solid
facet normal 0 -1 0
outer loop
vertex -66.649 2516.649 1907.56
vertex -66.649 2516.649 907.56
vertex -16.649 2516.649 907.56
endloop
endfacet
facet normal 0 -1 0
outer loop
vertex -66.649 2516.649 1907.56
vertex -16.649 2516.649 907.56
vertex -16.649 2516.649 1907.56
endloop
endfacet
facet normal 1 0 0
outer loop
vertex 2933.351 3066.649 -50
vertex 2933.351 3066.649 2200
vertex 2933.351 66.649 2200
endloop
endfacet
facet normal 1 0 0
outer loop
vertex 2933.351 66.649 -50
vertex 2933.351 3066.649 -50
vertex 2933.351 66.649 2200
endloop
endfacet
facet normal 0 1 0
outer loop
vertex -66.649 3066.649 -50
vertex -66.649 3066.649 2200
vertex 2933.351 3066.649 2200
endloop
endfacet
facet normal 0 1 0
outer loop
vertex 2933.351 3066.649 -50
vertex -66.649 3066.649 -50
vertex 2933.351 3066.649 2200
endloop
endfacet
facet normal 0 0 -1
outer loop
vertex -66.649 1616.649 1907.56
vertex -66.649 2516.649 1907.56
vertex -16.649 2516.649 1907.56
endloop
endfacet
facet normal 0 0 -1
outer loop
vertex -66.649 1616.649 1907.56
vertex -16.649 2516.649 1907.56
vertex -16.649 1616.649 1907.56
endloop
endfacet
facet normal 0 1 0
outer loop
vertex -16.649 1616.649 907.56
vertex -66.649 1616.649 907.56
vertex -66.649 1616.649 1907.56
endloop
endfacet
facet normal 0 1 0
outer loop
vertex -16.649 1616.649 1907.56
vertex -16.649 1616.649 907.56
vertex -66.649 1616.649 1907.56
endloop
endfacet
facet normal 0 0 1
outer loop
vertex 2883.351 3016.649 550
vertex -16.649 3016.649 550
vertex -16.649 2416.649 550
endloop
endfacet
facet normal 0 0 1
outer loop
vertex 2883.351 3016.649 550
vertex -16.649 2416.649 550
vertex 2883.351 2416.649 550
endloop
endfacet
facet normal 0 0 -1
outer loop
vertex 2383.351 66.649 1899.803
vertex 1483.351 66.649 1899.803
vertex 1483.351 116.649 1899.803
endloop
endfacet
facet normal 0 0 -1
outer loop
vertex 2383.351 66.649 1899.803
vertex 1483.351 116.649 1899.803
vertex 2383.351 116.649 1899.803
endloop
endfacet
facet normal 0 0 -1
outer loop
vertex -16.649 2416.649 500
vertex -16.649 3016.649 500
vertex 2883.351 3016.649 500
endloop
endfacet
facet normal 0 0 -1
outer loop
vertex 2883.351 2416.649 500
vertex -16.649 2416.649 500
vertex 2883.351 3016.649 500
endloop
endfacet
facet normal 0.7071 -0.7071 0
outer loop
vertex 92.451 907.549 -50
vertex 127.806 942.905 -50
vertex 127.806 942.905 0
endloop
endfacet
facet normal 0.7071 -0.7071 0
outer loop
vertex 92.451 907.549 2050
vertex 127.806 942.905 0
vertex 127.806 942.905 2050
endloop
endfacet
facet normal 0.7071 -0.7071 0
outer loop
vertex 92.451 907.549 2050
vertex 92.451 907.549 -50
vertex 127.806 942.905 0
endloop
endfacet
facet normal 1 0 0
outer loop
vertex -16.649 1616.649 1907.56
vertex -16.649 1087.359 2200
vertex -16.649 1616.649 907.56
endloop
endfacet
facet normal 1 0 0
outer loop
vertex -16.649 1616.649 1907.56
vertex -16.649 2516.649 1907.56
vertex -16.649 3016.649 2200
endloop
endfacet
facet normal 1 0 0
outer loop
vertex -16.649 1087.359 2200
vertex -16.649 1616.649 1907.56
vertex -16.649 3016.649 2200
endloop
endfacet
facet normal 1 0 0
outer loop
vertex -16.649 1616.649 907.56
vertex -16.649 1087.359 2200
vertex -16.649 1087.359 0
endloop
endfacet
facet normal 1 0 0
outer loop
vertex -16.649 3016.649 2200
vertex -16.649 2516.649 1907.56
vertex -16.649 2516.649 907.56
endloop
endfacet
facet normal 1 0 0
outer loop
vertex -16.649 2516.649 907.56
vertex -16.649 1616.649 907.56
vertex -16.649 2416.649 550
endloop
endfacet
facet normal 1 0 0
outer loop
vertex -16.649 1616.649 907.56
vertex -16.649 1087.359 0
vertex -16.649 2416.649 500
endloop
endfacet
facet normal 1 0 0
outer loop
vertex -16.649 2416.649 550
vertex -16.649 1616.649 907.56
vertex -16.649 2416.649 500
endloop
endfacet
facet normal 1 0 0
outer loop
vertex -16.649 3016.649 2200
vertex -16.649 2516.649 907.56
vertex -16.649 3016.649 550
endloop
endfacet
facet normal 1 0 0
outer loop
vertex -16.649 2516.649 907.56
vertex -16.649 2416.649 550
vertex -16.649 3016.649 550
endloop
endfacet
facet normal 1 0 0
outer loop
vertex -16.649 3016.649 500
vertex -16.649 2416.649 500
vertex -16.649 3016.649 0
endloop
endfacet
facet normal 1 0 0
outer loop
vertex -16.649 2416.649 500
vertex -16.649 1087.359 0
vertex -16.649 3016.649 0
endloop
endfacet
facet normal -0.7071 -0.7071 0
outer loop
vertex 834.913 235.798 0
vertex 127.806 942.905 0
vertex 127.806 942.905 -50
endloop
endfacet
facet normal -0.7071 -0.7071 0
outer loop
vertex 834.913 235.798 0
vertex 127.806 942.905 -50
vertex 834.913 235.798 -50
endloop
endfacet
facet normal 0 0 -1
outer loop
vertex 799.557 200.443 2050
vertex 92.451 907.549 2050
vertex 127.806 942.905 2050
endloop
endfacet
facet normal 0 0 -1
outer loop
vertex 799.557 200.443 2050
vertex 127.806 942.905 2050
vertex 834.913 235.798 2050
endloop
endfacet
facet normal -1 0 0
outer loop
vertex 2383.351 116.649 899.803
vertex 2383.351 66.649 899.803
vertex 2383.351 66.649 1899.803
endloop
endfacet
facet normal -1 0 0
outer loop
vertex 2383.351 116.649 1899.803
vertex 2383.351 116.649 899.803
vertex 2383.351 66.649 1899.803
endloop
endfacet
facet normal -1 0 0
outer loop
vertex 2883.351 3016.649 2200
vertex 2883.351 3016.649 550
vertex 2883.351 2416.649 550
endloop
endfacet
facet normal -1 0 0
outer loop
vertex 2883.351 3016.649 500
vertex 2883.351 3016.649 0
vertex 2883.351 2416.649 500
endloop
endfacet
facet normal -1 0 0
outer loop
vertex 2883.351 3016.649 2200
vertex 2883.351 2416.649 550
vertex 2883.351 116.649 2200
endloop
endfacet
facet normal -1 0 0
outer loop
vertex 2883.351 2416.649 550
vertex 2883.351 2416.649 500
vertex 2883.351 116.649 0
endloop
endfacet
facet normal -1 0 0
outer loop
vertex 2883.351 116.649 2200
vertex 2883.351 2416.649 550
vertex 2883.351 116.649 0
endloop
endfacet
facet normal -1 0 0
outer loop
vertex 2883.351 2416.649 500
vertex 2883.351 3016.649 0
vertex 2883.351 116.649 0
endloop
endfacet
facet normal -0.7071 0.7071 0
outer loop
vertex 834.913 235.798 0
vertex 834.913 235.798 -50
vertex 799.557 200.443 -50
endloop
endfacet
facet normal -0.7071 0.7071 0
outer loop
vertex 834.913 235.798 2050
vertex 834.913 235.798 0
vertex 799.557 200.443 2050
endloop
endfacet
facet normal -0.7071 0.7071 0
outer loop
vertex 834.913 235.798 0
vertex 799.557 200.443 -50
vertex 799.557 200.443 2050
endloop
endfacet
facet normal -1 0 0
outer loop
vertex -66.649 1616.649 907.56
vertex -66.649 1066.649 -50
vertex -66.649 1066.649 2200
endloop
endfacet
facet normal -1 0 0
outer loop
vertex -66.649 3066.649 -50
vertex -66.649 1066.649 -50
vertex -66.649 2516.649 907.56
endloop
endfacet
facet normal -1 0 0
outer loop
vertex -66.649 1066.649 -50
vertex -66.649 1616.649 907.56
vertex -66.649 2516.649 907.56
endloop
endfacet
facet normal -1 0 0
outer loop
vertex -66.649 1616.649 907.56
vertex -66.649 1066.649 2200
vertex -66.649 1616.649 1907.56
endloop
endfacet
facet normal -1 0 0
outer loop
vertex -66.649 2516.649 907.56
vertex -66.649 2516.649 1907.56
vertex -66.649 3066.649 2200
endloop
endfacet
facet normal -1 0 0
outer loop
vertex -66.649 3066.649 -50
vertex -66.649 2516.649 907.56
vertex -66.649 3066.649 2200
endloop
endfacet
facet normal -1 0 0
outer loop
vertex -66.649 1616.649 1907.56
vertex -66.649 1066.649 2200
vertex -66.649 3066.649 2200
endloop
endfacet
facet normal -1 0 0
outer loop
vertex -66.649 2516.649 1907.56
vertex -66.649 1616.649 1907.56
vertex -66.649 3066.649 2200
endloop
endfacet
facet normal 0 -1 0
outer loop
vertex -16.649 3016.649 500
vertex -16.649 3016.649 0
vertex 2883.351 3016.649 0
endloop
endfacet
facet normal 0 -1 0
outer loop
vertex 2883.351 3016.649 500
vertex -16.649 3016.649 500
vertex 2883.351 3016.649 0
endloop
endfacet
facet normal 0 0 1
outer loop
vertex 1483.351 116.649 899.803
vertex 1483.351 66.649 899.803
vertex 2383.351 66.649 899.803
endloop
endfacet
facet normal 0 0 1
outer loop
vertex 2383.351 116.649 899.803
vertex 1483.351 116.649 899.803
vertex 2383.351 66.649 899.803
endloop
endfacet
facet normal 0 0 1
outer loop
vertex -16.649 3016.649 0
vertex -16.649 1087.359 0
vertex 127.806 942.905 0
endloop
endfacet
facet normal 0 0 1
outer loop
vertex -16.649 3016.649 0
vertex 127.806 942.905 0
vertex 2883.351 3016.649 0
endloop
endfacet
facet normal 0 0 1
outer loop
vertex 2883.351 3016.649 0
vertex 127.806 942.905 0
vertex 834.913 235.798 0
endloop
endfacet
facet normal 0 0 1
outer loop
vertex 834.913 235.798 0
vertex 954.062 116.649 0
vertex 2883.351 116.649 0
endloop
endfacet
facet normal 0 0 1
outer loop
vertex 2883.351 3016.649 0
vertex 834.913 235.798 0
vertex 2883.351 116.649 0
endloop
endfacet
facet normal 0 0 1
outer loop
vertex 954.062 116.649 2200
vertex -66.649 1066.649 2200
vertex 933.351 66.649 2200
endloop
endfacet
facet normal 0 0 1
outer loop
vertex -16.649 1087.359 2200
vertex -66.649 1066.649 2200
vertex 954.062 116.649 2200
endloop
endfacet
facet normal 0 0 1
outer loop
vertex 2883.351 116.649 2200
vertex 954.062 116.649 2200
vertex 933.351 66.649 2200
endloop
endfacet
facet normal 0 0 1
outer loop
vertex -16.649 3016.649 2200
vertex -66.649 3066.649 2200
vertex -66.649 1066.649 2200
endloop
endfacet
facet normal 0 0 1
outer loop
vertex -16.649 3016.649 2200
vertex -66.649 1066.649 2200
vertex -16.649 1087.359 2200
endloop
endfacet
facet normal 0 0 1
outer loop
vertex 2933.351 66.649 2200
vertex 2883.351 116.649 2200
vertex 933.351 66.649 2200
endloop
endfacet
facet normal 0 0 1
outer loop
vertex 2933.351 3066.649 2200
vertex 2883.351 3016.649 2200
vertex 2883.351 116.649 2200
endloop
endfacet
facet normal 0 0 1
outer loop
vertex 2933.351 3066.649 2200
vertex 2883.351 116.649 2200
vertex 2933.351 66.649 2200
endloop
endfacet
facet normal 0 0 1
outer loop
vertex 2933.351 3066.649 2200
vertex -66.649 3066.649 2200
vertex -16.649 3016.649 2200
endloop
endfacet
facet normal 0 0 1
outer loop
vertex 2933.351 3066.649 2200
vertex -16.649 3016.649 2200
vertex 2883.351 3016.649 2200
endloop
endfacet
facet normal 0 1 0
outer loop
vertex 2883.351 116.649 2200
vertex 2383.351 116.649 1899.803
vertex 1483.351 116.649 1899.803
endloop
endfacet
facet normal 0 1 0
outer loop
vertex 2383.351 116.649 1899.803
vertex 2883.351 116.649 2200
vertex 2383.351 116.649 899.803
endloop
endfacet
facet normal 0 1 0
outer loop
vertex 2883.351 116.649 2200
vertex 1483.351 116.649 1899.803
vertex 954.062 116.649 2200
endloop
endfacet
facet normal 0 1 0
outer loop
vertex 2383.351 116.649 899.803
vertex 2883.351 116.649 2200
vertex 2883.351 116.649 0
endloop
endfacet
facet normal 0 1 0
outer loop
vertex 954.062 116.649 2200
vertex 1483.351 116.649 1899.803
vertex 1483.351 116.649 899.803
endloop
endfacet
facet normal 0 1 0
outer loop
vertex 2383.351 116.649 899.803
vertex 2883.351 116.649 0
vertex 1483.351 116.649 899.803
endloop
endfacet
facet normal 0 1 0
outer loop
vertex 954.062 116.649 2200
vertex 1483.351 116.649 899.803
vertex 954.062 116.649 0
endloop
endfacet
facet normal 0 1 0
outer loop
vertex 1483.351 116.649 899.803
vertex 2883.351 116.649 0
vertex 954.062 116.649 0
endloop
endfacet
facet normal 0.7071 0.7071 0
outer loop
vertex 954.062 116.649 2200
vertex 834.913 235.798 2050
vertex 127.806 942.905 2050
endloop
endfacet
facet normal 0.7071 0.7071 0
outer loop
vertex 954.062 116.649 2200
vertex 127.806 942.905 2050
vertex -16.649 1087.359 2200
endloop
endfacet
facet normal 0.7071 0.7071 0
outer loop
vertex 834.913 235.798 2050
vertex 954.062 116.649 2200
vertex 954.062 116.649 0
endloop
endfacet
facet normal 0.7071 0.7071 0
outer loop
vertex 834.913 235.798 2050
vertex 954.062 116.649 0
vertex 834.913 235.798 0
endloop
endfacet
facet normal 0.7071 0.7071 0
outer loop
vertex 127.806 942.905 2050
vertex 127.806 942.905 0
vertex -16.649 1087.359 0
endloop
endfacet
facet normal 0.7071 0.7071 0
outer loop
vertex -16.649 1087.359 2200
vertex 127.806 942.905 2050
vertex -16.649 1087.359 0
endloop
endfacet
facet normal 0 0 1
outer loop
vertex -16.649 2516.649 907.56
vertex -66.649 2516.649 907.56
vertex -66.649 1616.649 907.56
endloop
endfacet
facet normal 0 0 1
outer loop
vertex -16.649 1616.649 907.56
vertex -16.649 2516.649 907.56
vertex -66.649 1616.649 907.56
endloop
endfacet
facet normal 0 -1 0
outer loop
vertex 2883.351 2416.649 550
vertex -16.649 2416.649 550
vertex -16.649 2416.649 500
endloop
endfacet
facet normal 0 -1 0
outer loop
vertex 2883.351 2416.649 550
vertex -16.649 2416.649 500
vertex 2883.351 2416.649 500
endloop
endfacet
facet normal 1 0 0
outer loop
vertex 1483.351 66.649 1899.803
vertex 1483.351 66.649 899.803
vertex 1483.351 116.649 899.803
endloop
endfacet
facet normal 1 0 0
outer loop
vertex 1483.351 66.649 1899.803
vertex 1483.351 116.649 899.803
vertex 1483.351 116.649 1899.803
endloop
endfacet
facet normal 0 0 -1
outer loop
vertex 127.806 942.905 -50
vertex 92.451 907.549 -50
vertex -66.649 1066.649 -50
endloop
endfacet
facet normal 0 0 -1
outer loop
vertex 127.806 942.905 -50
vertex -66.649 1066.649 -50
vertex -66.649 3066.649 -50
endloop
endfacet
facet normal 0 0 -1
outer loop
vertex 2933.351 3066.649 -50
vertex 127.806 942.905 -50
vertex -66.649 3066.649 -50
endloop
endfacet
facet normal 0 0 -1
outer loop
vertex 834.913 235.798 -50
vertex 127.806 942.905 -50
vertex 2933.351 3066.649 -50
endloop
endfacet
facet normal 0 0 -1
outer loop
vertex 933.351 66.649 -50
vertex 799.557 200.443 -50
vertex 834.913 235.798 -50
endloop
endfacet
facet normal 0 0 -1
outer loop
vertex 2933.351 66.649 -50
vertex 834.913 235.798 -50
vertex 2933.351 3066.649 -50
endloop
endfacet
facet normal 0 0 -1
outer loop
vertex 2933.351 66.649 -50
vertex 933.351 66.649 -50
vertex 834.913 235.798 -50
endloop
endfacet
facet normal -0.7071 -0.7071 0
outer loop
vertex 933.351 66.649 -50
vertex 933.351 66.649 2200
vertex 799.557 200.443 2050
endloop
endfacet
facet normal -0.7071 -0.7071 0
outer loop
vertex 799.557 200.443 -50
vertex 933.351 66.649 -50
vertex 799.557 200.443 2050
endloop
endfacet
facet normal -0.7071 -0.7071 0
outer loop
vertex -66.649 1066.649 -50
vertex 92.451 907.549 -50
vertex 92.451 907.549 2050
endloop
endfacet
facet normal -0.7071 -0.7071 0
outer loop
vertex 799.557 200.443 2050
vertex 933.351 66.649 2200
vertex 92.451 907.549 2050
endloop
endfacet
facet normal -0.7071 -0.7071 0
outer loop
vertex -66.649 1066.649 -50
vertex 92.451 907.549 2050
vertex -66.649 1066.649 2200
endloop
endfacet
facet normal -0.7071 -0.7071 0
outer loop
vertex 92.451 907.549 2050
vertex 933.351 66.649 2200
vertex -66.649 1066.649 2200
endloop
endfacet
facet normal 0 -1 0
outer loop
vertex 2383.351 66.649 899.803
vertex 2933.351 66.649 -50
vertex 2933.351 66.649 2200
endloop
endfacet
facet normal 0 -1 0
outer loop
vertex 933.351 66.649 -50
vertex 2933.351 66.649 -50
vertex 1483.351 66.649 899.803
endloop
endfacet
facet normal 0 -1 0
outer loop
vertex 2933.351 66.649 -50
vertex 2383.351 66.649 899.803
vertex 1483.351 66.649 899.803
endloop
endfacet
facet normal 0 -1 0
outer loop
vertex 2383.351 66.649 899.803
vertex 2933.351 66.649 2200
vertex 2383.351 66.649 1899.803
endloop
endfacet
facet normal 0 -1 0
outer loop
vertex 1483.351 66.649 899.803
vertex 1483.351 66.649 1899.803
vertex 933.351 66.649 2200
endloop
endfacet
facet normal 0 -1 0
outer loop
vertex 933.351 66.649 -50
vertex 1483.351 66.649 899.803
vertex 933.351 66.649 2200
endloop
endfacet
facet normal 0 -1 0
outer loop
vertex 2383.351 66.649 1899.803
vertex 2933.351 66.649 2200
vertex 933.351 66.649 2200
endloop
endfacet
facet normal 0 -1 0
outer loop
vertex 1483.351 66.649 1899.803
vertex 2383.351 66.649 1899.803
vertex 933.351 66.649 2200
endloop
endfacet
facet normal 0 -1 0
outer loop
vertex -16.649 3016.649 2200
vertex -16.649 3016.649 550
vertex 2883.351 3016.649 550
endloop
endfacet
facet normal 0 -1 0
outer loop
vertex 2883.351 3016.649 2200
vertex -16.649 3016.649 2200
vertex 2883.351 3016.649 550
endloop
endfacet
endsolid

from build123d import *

# Parameters (mm, degrees)
F1_DEPTH  = 2200
F3_DEPTH  = 50
F4_W      = 1000
F4_H      = 2100
F5_DEPTH  = 50
F6_W      = 900
F6_H      = 1000
F7_DEPTH  = 50
F8_W      = 900
F8_H      = 1000
F9_DEPTH  = 50
F10_W     = 2900
F10_H     = 50
F11_DEPTH = 600


with BuildPart() as f1:
    # F0 (on Top) → F1 (new body)
    with BuildSketch(Plane.XY):
        Polygon((-66.648518, 1066.648518), (933.351482, 66.648518), (2933.351482, 66.648518), (2933.351482, 3066.648518), (-66.648518, 3066.648518), align=None)
        Polygon((2883.351482, 3016.648518), (2883.351482, 116.648518), (954.06216, 116.648518), (-16.648518, 1087.359196), (-16.648518, 3016.648518), align=None, mode=Mode.SUBTRACT)
    extrude(amount=F1_DEPTH)

    # F2 (on face) → F3 (join)
    with BuildSketch(Plane(origin=(0, 0, 0), x_dir=(1, 0, 0), z_dir=(0, 0, -1))):
        Polygon((2933.351482, -3066.648518), (2933.351482, -66.648518), (933.351482, -66.648518), (-66.648518, -1066.648518), (-66.648518, -3066.648518), align=None)
    extrude(amount=F3_DEPTH)

    # F4 (on face) → F5 (cut)
    with BuildSketch(Plane(origin=(500, 500, 0), x_dir=(0.707107, -0.707107, 0), z_dir=(-0.707107, -0.707107, 0))):
        with Locations((-76.362019, 1000)):
            Rectangle(F4_W, F4_H)
    extrude(amount=-F5_DEPTH, mode=Mode.SUBTRACT)

    # F6 (on face) → F7 (cut)
    with BuildSketch(Plane.XZ.offset(-66.648518)):
        with Locations((1933.351482, 1399.802713)):
            Rectangle(F6_W, F6_H)
    extrude(amount=-F7_DEPTH, mode=Mode.SUBTRACT)

    # F8 (on face) → F9 (cut)
    with BuildSketch(Plane(origin=(-66.648518, 0, 0), x_dir=(0, -1, 0), z_dir=(-1, 0, 0))):
        with Locations((-2066.648518, 1407.559663)):
            Rectangle(F8_W, F8_H)
    extrude(amount=-F9_DEPTH, mode=Mode.SUBTRACT)

    # F10 (on face) → F11 (join)
    with BuildSketch(Plane.XZ.offset(-3016.648518)):
        with Locations((1433.351482, 525)):
            Rectangle(F10_W, F10_H)
    extrude(amount=F11_DEPTH)


solid = f1.part
